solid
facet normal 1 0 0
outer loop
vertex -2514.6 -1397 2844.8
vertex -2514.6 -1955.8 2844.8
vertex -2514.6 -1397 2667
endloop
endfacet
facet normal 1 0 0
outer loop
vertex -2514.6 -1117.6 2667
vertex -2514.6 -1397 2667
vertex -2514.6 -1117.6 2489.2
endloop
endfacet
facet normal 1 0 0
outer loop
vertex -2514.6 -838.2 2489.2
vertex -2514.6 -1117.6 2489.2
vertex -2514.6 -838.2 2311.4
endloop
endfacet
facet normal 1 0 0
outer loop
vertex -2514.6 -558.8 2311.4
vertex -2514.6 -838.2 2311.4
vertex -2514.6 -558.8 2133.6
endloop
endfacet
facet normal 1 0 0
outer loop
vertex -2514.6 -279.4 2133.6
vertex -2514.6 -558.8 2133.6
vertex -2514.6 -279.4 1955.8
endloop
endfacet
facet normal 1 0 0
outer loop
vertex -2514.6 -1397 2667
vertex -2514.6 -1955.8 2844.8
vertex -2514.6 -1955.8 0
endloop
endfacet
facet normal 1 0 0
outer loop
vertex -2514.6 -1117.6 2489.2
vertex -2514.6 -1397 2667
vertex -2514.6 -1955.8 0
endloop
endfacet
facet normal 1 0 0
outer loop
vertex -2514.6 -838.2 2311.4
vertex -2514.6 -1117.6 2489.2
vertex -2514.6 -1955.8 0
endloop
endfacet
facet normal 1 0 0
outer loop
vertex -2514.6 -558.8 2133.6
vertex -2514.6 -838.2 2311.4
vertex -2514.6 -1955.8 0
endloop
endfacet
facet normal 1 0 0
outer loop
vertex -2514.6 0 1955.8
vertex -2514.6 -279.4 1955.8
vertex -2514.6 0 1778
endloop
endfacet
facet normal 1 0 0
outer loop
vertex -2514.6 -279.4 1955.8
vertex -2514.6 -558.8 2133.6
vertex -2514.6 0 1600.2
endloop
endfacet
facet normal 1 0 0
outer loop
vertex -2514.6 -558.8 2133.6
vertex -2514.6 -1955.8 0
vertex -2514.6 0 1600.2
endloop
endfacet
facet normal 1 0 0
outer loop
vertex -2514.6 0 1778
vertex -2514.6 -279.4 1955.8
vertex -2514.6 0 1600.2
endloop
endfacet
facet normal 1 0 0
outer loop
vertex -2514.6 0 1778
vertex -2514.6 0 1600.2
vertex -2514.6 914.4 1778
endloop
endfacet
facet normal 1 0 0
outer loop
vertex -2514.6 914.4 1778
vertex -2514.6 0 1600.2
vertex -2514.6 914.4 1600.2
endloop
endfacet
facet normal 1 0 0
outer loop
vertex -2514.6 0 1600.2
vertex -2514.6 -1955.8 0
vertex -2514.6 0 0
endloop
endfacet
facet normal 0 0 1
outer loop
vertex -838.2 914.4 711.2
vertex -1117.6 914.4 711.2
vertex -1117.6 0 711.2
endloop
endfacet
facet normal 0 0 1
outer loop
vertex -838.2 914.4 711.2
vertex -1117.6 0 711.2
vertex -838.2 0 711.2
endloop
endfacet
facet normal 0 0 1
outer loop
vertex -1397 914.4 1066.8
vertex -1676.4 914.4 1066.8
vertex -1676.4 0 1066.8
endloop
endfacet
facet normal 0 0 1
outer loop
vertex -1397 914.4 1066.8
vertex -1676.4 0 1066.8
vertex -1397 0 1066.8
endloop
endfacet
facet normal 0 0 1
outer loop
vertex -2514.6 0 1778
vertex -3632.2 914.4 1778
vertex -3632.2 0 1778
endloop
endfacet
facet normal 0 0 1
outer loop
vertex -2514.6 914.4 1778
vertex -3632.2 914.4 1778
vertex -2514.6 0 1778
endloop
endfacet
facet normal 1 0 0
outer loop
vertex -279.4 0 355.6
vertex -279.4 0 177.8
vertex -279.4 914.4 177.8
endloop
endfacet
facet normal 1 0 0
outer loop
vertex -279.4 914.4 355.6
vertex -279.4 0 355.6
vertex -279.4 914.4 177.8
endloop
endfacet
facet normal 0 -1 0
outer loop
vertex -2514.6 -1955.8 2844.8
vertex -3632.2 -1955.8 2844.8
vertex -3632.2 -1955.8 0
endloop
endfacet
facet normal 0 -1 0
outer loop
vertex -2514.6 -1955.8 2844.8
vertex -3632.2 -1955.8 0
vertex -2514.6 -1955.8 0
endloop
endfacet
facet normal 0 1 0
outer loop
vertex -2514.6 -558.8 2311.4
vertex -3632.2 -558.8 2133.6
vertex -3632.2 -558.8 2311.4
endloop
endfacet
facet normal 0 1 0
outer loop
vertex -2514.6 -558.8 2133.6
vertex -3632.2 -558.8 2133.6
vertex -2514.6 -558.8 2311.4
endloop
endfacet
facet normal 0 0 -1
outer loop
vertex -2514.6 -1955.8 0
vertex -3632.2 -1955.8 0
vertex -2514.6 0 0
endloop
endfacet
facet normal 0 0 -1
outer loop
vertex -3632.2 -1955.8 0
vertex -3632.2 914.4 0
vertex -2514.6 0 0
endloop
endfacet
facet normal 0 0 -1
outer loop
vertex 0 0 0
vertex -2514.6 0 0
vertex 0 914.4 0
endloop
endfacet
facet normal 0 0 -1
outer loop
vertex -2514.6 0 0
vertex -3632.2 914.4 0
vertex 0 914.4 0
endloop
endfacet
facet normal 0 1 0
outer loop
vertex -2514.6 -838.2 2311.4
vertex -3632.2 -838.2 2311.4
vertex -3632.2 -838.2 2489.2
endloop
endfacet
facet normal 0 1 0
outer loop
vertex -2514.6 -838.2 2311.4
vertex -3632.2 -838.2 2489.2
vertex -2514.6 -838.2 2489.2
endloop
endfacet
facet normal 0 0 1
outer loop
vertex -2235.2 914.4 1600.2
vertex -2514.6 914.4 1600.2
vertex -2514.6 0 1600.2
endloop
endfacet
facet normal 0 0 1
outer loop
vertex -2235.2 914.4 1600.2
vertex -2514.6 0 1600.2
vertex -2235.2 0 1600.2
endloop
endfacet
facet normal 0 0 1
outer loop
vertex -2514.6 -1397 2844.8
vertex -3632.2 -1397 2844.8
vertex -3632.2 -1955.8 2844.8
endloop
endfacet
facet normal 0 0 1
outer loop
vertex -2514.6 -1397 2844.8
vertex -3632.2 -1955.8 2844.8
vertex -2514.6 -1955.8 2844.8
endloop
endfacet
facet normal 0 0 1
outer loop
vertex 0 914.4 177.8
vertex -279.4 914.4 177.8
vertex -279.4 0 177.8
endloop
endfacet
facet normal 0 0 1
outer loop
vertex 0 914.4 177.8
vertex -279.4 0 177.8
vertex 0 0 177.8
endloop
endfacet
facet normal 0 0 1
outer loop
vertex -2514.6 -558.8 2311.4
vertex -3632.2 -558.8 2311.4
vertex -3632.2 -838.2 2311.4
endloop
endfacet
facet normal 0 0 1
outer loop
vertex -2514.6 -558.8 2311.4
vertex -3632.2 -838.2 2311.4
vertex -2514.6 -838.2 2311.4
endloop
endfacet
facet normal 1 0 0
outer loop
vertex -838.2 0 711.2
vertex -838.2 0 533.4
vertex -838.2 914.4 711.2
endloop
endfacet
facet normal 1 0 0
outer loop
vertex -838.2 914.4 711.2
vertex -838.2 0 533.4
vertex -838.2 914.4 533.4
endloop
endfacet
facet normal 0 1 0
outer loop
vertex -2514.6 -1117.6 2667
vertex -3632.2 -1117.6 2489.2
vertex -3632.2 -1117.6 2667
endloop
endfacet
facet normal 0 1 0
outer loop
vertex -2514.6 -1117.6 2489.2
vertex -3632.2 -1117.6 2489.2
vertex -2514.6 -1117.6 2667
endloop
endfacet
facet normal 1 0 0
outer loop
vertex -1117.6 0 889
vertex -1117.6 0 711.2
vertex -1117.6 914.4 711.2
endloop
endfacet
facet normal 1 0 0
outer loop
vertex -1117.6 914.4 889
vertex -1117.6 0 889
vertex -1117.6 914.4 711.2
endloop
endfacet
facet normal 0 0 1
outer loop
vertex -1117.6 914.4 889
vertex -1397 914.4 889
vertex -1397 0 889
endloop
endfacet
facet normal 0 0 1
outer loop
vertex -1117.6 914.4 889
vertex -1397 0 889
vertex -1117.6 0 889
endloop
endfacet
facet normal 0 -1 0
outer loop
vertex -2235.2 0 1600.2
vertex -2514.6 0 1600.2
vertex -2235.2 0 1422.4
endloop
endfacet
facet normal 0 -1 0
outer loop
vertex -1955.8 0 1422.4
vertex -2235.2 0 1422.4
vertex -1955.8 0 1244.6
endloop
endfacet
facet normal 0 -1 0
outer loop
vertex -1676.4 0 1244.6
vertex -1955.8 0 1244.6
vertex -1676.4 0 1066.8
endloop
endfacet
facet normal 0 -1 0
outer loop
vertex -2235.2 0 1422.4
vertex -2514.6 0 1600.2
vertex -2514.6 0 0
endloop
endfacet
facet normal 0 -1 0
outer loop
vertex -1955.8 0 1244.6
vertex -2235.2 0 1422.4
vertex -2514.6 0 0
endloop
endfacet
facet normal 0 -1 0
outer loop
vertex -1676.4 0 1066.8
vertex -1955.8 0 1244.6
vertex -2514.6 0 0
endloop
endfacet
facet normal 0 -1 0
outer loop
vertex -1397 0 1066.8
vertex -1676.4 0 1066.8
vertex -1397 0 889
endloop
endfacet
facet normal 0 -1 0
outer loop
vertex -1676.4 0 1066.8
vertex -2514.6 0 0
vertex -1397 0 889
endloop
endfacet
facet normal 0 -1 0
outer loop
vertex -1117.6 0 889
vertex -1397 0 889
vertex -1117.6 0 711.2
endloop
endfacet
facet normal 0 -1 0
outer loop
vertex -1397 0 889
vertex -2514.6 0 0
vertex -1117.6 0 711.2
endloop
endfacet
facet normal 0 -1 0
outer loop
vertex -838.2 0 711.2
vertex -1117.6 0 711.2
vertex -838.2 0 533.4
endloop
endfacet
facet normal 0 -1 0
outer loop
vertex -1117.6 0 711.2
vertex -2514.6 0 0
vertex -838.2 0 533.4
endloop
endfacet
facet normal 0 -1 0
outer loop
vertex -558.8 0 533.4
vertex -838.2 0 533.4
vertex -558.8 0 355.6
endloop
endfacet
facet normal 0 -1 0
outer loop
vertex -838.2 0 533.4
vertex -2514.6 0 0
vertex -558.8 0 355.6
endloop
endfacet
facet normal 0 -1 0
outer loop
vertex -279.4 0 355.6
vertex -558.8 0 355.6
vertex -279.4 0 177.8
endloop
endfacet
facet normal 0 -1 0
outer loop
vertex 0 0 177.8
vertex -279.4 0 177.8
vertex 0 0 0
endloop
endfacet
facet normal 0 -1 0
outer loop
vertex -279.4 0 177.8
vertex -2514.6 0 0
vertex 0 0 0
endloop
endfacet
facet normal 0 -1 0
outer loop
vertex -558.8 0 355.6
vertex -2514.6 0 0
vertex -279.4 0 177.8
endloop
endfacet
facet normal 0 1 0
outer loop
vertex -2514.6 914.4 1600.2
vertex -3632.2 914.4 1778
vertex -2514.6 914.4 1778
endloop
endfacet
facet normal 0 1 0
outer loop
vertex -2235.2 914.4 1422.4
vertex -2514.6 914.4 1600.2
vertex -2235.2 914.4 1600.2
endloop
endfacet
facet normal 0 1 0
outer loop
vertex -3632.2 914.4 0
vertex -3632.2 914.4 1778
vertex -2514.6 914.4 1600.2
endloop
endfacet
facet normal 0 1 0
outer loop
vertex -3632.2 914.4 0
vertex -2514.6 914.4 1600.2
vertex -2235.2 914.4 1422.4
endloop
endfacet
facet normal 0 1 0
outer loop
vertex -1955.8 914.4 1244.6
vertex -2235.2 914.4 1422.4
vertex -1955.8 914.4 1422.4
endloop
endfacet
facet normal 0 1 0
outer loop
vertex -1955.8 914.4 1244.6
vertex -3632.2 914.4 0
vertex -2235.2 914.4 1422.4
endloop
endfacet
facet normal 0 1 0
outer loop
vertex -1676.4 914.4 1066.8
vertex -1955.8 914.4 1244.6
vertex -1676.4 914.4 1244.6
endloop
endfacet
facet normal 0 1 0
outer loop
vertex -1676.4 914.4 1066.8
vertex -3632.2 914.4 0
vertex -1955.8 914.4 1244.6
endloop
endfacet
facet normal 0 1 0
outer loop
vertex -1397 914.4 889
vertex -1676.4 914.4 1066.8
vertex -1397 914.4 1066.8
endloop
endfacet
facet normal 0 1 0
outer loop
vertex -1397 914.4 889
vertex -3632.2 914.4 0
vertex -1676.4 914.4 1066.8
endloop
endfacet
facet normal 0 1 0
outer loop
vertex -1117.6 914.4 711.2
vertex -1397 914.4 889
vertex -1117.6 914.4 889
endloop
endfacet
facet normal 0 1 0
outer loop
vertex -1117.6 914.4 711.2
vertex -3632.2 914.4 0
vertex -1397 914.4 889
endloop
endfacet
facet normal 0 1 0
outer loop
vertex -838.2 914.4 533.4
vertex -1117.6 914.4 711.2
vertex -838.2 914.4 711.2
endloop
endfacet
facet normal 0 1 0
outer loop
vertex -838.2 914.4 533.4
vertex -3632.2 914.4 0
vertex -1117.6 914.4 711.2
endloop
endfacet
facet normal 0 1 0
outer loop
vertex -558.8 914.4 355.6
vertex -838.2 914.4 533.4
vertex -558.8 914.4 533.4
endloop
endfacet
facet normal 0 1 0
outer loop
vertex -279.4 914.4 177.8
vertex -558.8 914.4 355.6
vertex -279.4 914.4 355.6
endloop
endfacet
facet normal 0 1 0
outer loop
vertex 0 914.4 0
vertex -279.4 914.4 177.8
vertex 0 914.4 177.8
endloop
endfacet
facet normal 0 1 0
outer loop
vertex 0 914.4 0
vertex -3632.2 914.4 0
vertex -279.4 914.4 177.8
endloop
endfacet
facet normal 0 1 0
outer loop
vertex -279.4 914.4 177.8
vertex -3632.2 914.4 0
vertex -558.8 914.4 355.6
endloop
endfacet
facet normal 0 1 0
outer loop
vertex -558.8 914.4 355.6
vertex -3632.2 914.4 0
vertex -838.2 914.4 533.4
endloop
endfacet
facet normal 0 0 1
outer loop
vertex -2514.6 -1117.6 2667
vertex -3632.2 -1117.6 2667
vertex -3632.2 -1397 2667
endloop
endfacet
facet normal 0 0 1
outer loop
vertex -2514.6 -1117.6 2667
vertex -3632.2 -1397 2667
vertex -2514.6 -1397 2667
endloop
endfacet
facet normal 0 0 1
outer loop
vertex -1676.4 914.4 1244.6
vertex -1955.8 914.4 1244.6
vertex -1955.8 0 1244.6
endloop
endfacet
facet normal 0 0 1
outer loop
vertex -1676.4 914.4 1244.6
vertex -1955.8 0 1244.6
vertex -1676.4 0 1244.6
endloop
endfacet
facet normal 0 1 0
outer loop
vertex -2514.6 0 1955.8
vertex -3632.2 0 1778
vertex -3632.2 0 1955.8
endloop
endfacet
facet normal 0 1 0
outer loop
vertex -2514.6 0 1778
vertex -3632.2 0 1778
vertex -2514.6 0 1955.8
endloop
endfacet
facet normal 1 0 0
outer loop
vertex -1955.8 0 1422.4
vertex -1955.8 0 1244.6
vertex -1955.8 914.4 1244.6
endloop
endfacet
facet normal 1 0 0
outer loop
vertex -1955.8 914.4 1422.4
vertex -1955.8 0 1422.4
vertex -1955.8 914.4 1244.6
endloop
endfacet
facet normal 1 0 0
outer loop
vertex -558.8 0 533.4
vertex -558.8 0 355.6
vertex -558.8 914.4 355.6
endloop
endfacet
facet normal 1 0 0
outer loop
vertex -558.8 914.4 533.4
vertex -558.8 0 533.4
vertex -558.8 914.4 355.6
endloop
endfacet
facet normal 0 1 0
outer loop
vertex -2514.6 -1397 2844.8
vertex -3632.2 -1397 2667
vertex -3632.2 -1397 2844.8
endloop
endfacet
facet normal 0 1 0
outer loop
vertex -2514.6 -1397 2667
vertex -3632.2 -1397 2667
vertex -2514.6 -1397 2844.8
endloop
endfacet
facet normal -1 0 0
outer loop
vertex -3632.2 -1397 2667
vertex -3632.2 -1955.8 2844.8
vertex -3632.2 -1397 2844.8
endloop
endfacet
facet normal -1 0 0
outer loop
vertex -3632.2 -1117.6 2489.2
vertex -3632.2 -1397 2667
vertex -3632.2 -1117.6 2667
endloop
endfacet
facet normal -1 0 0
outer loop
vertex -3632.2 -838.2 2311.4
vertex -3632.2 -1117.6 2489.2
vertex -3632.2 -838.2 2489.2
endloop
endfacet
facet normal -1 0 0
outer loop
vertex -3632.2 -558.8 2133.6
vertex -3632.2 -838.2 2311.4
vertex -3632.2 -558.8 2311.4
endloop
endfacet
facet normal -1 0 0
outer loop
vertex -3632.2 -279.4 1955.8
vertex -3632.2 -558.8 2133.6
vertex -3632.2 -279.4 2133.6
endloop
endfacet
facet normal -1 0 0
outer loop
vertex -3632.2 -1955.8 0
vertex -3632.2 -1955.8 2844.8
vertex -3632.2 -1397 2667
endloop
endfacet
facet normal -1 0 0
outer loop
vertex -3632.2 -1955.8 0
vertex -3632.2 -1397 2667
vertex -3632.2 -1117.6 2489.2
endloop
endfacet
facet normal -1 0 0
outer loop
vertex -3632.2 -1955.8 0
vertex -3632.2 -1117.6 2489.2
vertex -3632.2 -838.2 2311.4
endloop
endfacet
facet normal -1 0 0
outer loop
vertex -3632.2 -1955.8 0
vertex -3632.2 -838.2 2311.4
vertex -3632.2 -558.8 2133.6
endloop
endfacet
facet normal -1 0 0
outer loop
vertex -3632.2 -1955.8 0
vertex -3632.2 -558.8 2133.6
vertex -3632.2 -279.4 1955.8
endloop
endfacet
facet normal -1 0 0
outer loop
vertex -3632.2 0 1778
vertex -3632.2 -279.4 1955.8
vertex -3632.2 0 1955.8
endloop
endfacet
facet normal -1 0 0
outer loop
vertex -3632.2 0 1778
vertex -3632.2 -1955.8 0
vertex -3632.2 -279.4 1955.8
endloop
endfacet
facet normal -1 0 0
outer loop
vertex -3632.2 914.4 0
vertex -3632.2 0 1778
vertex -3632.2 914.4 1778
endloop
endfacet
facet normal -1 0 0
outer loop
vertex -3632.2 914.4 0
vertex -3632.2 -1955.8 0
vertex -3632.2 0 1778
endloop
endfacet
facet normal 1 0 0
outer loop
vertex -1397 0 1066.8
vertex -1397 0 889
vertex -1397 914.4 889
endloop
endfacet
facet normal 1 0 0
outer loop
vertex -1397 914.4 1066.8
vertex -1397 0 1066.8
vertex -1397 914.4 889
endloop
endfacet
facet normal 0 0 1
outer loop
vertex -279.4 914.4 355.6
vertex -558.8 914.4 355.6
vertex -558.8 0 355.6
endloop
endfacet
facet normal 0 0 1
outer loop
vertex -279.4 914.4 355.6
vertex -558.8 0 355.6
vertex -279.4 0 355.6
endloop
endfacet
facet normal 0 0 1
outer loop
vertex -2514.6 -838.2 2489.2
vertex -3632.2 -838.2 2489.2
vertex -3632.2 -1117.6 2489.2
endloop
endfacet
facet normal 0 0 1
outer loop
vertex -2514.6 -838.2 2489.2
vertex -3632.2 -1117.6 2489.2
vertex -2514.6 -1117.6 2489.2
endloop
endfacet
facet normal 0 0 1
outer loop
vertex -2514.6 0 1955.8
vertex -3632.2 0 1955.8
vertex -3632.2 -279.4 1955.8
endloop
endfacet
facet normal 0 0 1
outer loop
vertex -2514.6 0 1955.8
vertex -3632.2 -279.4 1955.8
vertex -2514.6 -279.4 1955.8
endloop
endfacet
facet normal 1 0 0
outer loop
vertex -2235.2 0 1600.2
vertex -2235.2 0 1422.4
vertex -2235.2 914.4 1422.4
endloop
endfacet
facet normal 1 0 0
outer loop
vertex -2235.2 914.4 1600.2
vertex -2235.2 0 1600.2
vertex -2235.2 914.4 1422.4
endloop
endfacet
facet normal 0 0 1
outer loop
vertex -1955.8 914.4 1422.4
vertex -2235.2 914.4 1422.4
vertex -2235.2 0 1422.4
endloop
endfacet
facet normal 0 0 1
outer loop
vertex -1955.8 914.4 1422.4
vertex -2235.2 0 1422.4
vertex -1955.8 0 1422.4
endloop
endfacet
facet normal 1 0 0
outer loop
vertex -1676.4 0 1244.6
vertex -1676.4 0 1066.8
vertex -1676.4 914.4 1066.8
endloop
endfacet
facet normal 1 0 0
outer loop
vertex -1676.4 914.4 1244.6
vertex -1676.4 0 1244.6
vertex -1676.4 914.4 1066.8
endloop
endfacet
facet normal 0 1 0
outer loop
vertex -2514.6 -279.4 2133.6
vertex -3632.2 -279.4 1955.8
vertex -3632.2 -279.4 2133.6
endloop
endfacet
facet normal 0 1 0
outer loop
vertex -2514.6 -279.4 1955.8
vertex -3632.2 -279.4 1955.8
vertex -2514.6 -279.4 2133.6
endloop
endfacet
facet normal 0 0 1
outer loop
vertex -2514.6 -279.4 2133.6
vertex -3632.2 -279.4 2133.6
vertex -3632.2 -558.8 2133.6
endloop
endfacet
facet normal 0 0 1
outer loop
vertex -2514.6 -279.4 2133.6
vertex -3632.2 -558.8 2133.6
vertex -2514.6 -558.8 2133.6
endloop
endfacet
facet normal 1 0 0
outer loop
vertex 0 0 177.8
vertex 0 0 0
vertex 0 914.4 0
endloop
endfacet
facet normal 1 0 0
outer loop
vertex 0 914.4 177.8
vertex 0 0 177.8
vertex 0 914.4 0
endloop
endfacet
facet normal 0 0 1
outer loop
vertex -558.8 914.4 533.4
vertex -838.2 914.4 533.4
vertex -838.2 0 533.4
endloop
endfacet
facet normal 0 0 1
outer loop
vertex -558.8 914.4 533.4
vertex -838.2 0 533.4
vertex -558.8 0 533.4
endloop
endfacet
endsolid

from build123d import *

# Parameters (mm, degrees)
F0_W      = 279.4
F0_H      = 914.4
F1_DEPTH  = 177.8
F2_DEPTH  = 355.6
F3_DEPTH  = 533.4
F4_DEPTH  = 711.2
F5_DEPTH  = 889
F6_DEPTH  = 1066.8
F7_DEPTH  = 1244.6
F8_DEPTH  = 1422.4
F9_DEPTH  = 1600.2
F0_W_2    = 1117.6
F10_DEPTH = 1778
F0_H_2    = 279.4
F11_DEPTH = 1955.8
F12_DEPTH = 2133.6
F13_DEPTH = 2311.4
F14_DEPTH = 2489.2
F15_DEPTH = 2667
F0_H_3    = 558.8
F16_DEPTH = 2844.8


with BuildPart() as f1:
    # F0 (on Top) → F1 (new body)
    with BuildSketch(Plane.XY):
        with Locations((-139.7, 457.2)):
            Rectangle(F0_W, F0_H)
    extrude(amount=F1_DEPTH)

    # F0 (on Top) → F2 (join)
    with BuildSketch(Plane.XY):
        with Locations((-419.1, 457.2)):
            Rectangle(F0_W, F0_H)
    extrude(amount=F2_DEPTH)

    # F0 (on Top) → F3 (join)
    with BuildSketch(Plane.XY):
        with Locations((-698.5, 457.2)):
            Rectangle(F0_W, F0_H)
    extrude(amount=F3_DEPTH)

    # F0 (on Top) → F4 (join)
    with BuildSketch(Plane.XY):
        with Locations((-977.9, 457.2)):
            Rectangle(F0_W, F0_H)
    extrude(amount=F4_DEPTH)

    # F0 (on Top) → F5 (join)
    with BuildSketch(Plane.XY):
        with Locations((-1257.3, 457.2)):
            Rectangle(F0_W, F0_H)
    extrude(amount=F5_DEPTH)

    # F0 (on Top) → F6 (join)
    with BuildSketch(Plane.XY):
        with Locations((-1536.7, 457.2)):
            Rectangle(F0_W, F0_H)
    extrude(amount=F6_DEPTH)

    # F0 (on Top) → F7 (join)
    with BuildSketch(Plane.XY):
        with Locations((-1816.1, 457.2)):
            Rectangle(F0_W, F0_H)
    extrude(amount=F7_DEPTH)

    # F0 (on Top) → F8 (join)
    with BuildSketch(Plane.XY):
        with Locations((-2095.5, 457.2)):
            Rectangle(F0_W, F0_H)
    extrude(amount=F8_DEPTH)

    # F0 (on Top) → F9 (join)
    with BuildSketch(Plane.XY):
        with Locations((-2374.9, 457.2)):
            Rectangle(F0_W, F0_H)
    extrude(amount=F9_DEPTH)

    # F0 (on Top) → F10 (join)
    with BuildSketch(Plane.XY):
        with Locations((-3073.4, 457.2)):
            Rectangle(F0_W_2, F0_H)
    extrude(amount=F10_DEPTH)

    # F0 (on Top) → F11 (join)
    with BuildSketch(Plane.XY):
        with Locations((-3073.4, -139.7)):
            Rectangle(F0_W_2, F0_H_2)
    extrude(amount=F11_DEPTH)

    # F0 (on Top) → F12 (join)
    with BuildSketch(Plane.XY):
        with Locations((-3073.4, -419.1)):
            Rectangle(F0_W_2, F0_H_2)
    extrude(amount=F12_DEPTH)

    # F0 (on Top) → F13 (join)
    with BuildSketch(Plane.XY):
        with Locations((-3073.4, -698.5)):
            Rectangle(F0_W_2, F0_H_2)
    extrude(amount=F13_DEPTH)

    # F0 (on Top) → F14 (join)
    with BuildSketch(Plane.XY):
        with Locations((-3073.4, -977.9)):
            Rectangle(F0_W_2, F0_H_2)
    extrude(amount=F14_DEPTH)

    # F0 (on Top) → F15 (join)
    with BuildSketch(Plane.XY):
        with Locations((-3073.4, -1257.3)):
            Rectangle(F0_W_2, F0_H_2)
    extrude(amount=F15_DEPTH)

    # F0 (on Top) → F16 (join)
    with BuildSketch(Plane.XY):
        with Locations((-3073.4, -1676.4)):
            Rectangle(F0_W_2, F0_H_3)
    extrude(amount=F16_DEPTH)


solid = f1.part
